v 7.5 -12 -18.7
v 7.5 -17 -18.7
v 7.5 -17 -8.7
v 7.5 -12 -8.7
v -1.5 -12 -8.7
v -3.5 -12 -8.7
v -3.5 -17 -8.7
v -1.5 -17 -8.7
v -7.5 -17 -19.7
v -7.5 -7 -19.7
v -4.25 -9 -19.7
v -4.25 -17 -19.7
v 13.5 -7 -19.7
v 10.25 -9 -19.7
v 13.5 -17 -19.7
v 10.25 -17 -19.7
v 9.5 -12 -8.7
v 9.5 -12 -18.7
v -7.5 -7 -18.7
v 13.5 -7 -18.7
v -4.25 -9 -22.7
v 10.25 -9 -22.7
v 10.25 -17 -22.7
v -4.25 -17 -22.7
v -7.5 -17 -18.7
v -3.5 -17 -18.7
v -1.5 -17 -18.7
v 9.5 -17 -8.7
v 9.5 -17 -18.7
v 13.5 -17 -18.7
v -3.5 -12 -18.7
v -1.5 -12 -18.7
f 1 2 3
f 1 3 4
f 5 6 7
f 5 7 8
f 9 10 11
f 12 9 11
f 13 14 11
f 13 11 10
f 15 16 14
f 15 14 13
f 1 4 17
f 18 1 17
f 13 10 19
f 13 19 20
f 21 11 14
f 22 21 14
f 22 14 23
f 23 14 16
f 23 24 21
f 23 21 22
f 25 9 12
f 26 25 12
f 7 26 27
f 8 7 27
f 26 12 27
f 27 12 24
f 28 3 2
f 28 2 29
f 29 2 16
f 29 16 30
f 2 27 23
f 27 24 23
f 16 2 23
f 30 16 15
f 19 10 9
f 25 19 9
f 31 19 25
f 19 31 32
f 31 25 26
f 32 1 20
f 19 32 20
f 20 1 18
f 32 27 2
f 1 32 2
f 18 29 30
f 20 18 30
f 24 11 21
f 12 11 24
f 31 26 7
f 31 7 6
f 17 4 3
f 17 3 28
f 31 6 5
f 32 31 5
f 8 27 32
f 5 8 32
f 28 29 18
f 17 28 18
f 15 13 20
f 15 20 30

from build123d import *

# Parameters (mm, degrees)
SKETCH124_W             = 14.5
SKETCH124_H             = 8
PAD065_DEPTH            = 3
SKETCH125_W             = 21
SKETCH125_H             = 10
PAD066_DEPTH            = 1
SKETCH126_W             = 2
SKETCH126_H             = 5
PAD067_DEPTH            = 10
BODY024_PLACEMENT_ANGLE = 180


with BuildPart() as part:
    # Sketch124 → Pad065 (new body)
    with BuildSketch(Plane.XY):
        Rectangle(SKETCH124_W, SKETCH124_H)
    extrude(amount=PAD065_DEPTH)

    # Sketch125 → Pad066 (join)
    with BuildSketch(Plane.XY):
        with Locations((0, -1)):
            Rectangle(SKETCH125_W, SKETCH125_H)
    extrude(amount=-PAD066_DEPTH)

    # Sketch126 → Pad067 (join)
    with BuildSketch(Plane(origin=(0, 0, -1), x_dir=(1, 0, 0), z_dir=(0, 0, -1))):
        with Locations((-5.5, -1.5)):
            Rectangle(SKETCH126_W, SKETCH126_H)
        with Locations((5.5, -1.5)):
            Rectangle(SKETCH126_W, SKETCH126_H)
    extrude(amount=PAD067_DEPTH)


with BuildPart() as part_1:
    # Body024 placement: moved
    add(part.part.moved(Location((3, -13, -19.7))).rotate(Axis((3, -13, -19.7), (1, 0, 0)), BODY024_PLACEMENT_ANGLE))


solid = part_1.part
